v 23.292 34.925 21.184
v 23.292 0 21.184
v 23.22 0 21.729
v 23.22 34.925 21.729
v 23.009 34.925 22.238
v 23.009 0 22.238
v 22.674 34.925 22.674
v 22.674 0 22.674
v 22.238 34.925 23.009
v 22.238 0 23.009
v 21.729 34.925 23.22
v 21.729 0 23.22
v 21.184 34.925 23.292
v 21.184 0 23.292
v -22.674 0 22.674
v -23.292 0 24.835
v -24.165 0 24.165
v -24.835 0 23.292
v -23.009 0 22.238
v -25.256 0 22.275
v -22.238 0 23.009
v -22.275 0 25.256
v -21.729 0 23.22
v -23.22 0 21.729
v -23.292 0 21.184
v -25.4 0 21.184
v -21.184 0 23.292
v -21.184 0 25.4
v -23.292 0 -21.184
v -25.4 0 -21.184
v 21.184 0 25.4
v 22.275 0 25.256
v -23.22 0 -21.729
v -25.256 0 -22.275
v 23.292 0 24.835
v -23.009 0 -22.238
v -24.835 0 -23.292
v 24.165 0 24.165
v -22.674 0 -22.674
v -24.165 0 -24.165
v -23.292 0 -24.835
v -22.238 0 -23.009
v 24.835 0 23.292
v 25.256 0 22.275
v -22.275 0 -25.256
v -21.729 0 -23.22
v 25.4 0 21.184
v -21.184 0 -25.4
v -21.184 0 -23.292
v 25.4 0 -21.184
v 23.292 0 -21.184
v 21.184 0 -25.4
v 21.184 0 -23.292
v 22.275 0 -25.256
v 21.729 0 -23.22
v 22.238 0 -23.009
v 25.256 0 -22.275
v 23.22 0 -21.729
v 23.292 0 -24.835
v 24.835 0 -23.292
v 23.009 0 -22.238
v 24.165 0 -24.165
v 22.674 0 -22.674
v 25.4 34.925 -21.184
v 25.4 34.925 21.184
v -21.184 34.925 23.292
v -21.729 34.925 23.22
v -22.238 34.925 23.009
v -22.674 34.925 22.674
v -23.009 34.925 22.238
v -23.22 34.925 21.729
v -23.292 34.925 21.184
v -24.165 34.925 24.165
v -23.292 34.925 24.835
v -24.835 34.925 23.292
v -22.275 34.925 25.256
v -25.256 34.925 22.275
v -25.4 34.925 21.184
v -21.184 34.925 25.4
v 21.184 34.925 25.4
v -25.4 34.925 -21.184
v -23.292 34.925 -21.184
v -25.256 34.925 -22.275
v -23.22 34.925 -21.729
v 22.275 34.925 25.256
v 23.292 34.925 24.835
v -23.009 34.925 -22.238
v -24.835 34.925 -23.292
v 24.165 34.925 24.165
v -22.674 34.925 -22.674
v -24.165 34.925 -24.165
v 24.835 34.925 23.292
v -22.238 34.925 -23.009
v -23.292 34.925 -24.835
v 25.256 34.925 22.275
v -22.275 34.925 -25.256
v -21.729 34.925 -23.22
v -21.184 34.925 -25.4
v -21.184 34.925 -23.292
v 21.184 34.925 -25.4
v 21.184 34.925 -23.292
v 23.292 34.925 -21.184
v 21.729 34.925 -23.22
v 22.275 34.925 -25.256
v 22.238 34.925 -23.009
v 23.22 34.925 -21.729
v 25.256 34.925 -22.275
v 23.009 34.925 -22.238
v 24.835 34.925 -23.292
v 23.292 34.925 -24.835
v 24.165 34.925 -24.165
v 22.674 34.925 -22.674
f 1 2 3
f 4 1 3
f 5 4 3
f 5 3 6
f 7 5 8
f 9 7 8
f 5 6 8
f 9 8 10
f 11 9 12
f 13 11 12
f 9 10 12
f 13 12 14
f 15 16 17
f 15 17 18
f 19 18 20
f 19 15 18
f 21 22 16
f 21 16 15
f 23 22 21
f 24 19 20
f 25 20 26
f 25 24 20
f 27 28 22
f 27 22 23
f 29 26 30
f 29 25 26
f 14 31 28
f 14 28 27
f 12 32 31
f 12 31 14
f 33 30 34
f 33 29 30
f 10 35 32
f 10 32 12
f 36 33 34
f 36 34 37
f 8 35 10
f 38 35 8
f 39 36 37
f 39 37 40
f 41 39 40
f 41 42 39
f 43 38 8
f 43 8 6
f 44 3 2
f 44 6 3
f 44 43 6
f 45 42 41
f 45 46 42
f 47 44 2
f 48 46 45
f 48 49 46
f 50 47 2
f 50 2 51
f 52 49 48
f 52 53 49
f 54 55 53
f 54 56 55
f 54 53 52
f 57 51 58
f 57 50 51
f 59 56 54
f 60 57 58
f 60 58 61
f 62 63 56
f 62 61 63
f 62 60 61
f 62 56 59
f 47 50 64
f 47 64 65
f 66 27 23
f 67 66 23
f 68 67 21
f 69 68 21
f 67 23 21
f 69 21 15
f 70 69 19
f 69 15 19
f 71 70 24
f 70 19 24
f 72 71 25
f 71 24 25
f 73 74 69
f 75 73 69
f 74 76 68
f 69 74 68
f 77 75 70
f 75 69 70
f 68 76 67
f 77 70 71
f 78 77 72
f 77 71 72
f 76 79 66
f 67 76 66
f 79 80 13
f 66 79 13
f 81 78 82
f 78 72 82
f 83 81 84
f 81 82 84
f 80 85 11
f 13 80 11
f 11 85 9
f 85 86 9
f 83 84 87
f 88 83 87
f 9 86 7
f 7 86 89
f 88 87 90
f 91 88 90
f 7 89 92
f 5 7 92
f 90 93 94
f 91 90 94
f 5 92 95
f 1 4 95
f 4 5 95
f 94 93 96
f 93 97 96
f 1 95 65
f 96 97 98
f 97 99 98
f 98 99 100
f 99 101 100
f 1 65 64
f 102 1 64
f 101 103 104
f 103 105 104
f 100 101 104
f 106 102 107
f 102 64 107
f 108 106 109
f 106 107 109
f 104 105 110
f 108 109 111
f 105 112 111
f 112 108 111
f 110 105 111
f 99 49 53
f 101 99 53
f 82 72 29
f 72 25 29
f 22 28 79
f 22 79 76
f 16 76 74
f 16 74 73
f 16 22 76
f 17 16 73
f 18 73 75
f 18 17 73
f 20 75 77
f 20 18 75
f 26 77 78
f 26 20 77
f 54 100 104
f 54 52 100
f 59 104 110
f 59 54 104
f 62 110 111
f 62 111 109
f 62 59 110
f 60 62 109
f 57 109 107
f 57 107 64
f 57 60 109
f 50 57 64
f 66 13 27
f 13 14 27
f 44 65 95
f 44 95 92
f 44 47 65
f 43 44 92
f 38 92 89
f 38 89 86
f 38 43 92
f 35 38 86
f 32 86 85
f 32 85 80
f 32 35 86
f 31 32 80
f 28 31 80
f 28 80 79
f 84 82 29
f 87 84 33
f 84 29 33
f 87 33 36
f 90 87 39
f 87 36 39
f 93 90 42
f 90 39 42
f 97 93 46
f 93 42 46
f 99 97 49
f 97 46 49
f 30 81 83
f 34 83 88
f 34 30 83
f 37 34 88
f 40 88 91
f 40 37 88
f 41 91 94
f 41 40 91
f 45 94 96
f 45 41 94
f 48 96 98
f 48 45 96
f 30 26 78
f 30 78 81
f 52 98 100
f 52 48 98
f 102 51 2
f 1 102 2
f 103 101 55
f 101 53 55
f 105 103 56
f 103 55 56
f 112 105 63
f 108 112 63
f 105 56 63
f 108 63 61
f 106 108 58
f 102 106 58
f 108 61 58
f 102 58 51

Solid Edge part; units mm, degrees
sketch "Sketch1" plane through (0, 0, 0) normal (0, -1, 0) x (1, 0, 0)
  arc A0 (-23.2918, -21.1836) -> (-21.1836, -23.2918) centre (-21.1836, -21.1836) ccw
  line L0 (-21.1836, -23.2918) -> (21.1836, -23.2918)
  arc A1 (21.1836, -23.2918) -> (23.2918, -21.1836) centre (21.1836, -21.1836) ccw
  line L1 (23.2918, -21.1836) -> (23.2918, 21.1836)
  arc A2 (23.2918, 21.1836) -> (21.1836, 23.2918) centre (21.1836, 21.1836) ccw
  line L2 (21.1836, 23.2918) -> (-21.1836, 23.2918)
  arc A3 (-21.1836, 23.2918) -> (-23.2918, 21.1836) centre (-21.1836, 21.1836) ccw
  line L3 (-23.2918, 21.1836) -> (-23.2918, -21.1836)
  arc A4 (-25.4, -21.1836) -> (-21.1836, -25.4) centre (-21.1836, -21.1836) ccw
  line L4 (-21.1836, -25.4) -> (21.1836, -25.4)
  arc A5 (21.1836, -25.4) -> (25.4, -21.1836) centre (21.1836, -21.1836) ccw
  line L5 (25.4, -21.1836) -> (25.4, 21.1836)
  arc A6 (25.4, 21.1836) -> (21.1836, 25.4) centre (21.1836, 21.1836) ccw
  line L6 (21.1836, 25.4) -> (-21.1836, 25.4)
  arc A7 (-21.1836, 25.4) -> (-25.4, 21.1836) centre (-21.1836, 21.1836) ccw
  line L7 (-25.4, 21.1836) -> (-25.4, -21.1836)
  dimension "D1" = 50.8
  dimension "D2" = 50.8
  dimension "D3" = 2.1082
  dimension "D4" = 2.1082
  dimension "D5" = 2.1082
  dimension "D6" = 2.1082
extrude "Protrusion1" add sketch "Sketch1" against normal blind 34.925
